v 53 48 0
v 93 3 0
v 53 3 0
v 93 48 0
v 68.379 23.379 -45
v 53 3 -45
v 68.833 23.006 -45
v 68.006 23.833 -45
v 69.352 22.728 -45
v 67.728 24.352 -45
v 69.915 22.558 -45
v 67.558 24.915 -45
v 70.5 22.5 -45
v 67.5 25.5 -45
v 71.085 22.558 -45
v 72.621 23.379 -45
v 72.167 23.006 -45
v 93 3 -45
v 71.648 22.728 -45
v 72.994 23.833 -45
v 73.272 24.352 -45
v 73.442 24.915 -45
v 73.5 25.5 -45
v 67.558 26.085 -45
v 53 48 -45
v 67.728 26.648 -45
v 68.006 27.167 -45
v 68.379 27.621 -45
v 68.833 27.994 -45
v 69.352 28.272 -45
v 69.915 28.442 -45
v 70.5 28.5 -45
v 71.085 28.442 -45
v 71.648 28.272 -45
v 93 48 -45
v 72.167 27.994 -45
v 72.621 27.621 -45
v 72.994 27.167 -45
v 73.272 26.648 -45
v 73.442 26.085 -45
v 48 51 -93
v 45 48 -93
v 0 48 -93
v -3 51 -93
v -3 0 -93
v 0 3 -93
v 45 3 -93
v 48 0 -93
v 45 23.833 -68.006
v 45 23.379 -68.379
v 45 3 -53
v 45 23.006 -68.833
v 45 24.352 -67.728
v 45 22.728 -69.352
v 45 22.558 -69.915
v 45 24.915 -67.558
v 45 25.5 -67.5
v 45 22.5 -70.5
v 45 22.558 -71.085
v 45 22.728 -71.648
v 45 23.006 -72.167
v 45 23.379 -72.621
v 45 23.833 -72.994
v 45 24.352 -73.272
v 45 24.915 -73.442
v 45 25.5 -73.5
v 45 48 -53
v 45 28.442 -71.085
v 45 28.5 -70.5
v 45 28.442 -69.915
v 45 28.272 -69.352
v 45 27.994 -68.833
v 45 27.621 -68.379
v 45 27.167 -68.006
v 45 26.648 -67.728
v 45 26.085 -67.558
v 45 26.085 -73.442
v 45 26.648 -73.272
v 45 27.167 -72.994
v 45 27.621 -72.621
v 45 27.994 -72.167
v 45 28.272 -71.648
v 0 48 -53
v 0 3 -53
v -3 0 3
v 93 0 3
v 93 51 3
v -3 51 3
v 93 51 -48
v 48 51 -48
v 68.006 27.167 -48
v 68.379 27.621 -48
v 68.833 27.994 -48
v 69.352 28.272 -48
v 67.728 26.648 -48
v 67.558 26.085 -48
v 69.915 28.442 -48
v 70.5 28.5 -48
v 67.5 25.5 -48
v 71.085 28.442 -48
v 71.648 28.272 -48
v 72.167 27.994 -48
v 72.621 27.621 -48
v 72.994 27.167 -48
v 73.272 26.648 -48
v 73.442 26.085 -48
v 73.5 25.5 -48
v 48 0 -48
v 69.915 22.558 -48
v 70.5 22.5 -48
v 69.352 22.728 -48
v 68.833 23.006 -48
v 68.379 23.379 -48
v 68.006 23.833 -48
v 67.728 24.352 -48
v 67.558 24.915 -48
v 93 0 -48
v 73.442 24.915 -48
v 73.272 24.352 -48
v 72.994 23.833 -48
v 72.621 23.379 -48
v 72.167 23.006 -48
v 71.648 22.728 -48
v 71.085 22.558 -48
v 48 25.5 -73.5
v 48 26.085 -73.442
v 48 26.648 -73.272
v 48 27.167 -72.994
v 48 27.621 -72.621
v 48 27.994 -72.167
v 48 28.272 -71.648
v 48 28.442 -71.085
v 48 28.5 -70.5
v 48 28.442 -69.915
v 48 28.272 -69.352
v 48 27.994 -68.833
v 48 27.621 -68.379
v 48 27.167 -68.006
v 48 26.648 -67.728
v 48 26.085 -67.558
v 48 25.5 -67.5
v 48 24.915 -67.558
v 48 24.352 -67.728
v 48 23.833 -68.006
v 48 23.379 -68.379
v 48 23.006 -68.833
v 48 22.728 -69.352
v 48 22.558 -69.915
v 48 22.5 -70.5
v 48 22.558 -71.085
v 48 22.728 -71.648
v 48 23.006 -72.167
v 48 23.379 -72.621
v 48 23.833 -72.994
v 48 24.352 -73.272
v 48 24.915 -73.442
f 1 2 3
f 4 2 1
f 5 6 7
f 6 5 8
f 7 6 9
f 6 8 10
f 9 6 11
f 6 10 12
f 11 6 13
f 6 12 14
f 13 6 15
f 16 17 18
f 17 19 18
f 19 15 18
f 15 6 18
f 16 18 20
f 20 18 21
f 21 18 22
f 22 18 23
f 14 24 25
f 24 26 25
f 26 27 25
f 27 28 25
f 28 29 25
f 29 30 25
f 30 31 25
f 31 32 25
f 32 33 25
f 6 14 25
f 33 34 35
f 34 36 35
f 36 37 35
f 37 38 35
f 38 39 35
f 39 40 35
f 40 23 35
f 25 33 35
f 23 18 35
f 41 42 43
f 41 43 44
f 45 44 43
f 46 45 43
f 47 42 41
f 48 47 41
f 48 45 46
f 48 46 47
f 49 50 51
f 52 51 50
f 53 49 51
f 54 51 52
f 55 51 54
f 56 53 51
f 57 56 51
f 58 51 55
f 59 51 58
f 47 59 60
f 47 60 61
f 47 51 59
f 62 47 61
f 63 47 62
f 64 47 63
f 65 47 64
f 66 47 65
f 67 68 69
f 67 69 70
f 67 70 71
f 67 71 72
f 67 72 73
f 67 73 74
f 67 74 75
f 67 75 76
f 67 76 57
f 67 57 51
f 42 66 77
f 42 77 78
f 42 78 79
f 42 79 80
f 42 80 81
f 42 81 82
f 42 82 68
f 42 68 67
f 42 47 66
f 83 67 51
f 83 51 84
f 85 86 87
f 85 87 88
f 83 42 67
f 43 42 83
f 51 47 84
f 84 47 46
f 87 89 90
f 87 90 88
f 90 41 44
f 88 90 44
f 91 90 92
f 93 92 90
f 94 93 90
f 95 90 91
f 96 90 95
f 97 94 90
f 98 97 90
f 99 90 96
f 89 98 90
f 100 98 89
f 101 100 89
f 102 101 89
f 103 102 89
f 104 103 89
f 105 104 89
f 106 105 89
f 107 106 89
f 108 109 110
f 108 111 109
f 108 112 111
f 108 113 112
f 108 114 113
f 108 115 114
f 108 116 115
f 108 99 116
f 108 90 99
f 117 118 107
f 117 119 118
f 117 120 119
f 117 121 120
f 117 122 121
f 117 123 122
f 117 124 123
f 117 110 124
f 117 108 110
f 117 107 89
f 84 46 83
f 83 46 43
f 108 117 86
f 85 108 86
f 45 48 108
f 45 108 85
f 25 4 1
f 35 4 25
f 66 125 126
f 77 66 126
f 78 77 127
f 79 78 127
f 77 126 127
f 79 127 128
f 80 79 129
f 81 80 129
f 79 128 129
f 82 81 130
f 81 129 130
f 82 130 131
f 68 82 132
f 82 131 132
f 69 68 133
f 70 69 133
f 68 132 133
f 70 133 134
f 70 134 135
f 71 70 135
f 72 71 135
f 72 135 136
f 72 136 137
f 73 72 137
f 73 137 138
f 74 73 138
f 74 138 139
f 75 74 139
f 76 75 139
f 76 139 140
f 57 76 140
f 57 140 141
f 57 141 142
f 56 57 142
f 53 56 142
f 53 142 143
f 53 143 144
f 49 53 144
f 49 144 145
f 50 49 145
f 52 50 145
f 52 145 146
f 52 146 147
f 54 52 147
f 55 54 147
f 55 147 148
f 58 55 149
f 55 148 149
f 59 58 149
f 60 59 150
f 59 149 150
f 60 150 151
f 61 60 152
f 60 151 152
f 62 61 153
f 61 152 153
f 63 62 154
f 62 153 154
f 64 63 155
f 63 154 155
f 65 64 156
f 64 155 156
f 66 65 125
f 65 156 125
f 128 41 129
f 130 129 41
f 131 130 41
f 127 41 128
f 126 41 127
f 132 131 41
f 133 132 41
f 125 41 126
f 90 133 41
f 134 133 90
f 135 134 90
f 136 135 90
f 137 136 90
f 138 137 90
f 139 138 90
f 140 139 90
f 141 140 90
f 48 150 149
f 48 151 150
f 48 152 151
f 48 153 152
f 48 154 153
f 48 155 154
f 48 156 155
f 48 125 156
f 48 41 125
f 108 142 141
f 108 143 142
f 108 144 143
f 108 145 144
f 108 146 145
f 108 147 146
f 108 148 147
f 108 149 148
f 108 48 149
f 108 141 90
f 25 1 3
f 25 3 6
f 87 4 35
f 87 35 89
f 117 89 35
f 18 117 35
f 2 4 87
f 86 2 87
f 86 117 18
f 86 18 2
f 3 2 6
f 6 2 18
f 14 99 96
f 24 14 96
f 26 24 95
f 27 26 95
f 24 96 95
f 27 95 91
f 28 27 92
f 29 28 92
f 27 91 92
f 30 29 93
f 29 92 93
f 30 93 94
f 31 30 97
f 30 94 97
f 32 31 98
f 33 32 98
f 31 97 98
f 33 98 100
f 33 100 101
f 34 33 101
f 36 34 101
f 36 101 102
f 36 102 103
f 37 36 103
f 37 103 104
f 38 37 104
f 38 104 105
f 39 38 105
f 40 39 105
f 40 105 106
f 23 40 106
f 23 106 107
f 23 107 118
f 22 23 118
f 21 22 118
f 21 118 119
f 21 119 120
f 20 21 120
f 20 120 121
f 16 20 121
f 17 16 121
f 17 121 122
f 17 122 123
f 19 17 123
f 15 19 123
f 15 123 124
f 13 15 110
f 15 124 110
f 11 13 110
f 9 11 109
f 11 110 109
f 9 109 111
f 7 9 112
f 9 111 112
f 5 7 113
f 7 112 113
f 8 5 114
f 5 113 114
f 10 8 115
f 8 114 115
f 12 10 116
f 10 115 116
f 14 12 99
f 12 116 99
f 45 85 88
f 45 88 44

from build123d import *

# Parameters (mm, degrees)
BOSS_EXTRUDE1_DEPTH = 51
SKETCH2_W           = 45
SKETCH2_H           = 45
CUT_EXTRUDE1_DEPTH  = 40
SKETCH3_W           = 45
SKETCH3_H           = 45
CUT_EXTRUDE2_DEPTH  = 40
CUT_EXTRUDE3_REACH  = 119.69
SKETCH4_R           = 3
CUT_EXTRUDE4_REACH  = 119.69
SKETCH5_R           = 3


with BuildPart() as part:
    # Sketch1 → Boss-Extrude1 (new body)
    with BuildSketch(Plane(origin=(0, 0, 0), x_dir=(1, 0, 0), z_dir=(0, 1, 0))):
        Polygon((-3, -3), (-3, 93), (48, 93), (48, 48), (93, 48), (93, -3), align=None)
    extrude(amount=BOSS_EXTRUDE1_DEPTH)

    # Sketch2 → Cut-Extrude1 (cut)
    with BuildSketch(Plane(origin=(93, 0, 0), x_dir=(0, 0, -1), z_dir=(1, 0, 0))):
        with Locations((22.5, 25.5)):
            Rectangle(SKETCH2_W, SKETCH2_H)
    extrude(amount=-CUT_EXTRUDE1_DEPTH, mode=Mode.SUBTRACT)

    # Sketch3 → Cut-Extrude2 (cut)
    with BuildSketch(Plane(origin=(0, 0, -93), x_dir=(-1, 0, 0), z_dir=(0, 0, -1))):
        with Locations((-22.5, 25.5)):
            Rectangle(SKETCH3_W, SKETCH3_H)
    extrude(amount=-CUT_EXTRUDE2_DEPTH, mode=Mode.SUBTRACT)

    # Sketch4 → Cut-Extrude3 (cut, up to next)
    with BuildSketch(Plane(origin=(0, 0, -48), x_dir=(-1, 0, 0), z_dir=(0, 0, -1)), mode=Mode.PRIVATE) as cut_extrude3_sk1:
        with Locations((-70.5, 25.5)):
            Circle(SKETCH4_R)
    cut_extrude3_tool1 = extrude(cut_extrude3_sk1.sketch, amount=-CUT_EXTRUDE3_REACH, mode=Mode.PRIVATE) & part.part
    add(cut_extrude3_tool1.solids().sort_by_distance((70.5, 25.5, -48))[0], mode=Mode.SUBTRACT)

    # Sketch5 → Cut-Extrude4 (cut, up to next)
    with BuildSketch(Plane(origin=(48, 0, 0), x_dir=(0, 0, -1), z_dir=(1, 0, 0)), mode=Mode.PRIVATE) as cut_extrude4_sk1:
        with Locations((70.5, 25.5)):
            Circle(SKETCH5_R)
    cut_extrude4_tool1 = extrude(cut_extrude4_sk1.sketch, amount=-CUT_EXTRUDE4_REACH, mode=Mode.PRIVATE) & part.part
    add(cut_extrude4_tool1.solids().sort_by_distance((48, 25.5, -70.5))[0], mode=Mode.SUBTRACT)


solid = part.part
